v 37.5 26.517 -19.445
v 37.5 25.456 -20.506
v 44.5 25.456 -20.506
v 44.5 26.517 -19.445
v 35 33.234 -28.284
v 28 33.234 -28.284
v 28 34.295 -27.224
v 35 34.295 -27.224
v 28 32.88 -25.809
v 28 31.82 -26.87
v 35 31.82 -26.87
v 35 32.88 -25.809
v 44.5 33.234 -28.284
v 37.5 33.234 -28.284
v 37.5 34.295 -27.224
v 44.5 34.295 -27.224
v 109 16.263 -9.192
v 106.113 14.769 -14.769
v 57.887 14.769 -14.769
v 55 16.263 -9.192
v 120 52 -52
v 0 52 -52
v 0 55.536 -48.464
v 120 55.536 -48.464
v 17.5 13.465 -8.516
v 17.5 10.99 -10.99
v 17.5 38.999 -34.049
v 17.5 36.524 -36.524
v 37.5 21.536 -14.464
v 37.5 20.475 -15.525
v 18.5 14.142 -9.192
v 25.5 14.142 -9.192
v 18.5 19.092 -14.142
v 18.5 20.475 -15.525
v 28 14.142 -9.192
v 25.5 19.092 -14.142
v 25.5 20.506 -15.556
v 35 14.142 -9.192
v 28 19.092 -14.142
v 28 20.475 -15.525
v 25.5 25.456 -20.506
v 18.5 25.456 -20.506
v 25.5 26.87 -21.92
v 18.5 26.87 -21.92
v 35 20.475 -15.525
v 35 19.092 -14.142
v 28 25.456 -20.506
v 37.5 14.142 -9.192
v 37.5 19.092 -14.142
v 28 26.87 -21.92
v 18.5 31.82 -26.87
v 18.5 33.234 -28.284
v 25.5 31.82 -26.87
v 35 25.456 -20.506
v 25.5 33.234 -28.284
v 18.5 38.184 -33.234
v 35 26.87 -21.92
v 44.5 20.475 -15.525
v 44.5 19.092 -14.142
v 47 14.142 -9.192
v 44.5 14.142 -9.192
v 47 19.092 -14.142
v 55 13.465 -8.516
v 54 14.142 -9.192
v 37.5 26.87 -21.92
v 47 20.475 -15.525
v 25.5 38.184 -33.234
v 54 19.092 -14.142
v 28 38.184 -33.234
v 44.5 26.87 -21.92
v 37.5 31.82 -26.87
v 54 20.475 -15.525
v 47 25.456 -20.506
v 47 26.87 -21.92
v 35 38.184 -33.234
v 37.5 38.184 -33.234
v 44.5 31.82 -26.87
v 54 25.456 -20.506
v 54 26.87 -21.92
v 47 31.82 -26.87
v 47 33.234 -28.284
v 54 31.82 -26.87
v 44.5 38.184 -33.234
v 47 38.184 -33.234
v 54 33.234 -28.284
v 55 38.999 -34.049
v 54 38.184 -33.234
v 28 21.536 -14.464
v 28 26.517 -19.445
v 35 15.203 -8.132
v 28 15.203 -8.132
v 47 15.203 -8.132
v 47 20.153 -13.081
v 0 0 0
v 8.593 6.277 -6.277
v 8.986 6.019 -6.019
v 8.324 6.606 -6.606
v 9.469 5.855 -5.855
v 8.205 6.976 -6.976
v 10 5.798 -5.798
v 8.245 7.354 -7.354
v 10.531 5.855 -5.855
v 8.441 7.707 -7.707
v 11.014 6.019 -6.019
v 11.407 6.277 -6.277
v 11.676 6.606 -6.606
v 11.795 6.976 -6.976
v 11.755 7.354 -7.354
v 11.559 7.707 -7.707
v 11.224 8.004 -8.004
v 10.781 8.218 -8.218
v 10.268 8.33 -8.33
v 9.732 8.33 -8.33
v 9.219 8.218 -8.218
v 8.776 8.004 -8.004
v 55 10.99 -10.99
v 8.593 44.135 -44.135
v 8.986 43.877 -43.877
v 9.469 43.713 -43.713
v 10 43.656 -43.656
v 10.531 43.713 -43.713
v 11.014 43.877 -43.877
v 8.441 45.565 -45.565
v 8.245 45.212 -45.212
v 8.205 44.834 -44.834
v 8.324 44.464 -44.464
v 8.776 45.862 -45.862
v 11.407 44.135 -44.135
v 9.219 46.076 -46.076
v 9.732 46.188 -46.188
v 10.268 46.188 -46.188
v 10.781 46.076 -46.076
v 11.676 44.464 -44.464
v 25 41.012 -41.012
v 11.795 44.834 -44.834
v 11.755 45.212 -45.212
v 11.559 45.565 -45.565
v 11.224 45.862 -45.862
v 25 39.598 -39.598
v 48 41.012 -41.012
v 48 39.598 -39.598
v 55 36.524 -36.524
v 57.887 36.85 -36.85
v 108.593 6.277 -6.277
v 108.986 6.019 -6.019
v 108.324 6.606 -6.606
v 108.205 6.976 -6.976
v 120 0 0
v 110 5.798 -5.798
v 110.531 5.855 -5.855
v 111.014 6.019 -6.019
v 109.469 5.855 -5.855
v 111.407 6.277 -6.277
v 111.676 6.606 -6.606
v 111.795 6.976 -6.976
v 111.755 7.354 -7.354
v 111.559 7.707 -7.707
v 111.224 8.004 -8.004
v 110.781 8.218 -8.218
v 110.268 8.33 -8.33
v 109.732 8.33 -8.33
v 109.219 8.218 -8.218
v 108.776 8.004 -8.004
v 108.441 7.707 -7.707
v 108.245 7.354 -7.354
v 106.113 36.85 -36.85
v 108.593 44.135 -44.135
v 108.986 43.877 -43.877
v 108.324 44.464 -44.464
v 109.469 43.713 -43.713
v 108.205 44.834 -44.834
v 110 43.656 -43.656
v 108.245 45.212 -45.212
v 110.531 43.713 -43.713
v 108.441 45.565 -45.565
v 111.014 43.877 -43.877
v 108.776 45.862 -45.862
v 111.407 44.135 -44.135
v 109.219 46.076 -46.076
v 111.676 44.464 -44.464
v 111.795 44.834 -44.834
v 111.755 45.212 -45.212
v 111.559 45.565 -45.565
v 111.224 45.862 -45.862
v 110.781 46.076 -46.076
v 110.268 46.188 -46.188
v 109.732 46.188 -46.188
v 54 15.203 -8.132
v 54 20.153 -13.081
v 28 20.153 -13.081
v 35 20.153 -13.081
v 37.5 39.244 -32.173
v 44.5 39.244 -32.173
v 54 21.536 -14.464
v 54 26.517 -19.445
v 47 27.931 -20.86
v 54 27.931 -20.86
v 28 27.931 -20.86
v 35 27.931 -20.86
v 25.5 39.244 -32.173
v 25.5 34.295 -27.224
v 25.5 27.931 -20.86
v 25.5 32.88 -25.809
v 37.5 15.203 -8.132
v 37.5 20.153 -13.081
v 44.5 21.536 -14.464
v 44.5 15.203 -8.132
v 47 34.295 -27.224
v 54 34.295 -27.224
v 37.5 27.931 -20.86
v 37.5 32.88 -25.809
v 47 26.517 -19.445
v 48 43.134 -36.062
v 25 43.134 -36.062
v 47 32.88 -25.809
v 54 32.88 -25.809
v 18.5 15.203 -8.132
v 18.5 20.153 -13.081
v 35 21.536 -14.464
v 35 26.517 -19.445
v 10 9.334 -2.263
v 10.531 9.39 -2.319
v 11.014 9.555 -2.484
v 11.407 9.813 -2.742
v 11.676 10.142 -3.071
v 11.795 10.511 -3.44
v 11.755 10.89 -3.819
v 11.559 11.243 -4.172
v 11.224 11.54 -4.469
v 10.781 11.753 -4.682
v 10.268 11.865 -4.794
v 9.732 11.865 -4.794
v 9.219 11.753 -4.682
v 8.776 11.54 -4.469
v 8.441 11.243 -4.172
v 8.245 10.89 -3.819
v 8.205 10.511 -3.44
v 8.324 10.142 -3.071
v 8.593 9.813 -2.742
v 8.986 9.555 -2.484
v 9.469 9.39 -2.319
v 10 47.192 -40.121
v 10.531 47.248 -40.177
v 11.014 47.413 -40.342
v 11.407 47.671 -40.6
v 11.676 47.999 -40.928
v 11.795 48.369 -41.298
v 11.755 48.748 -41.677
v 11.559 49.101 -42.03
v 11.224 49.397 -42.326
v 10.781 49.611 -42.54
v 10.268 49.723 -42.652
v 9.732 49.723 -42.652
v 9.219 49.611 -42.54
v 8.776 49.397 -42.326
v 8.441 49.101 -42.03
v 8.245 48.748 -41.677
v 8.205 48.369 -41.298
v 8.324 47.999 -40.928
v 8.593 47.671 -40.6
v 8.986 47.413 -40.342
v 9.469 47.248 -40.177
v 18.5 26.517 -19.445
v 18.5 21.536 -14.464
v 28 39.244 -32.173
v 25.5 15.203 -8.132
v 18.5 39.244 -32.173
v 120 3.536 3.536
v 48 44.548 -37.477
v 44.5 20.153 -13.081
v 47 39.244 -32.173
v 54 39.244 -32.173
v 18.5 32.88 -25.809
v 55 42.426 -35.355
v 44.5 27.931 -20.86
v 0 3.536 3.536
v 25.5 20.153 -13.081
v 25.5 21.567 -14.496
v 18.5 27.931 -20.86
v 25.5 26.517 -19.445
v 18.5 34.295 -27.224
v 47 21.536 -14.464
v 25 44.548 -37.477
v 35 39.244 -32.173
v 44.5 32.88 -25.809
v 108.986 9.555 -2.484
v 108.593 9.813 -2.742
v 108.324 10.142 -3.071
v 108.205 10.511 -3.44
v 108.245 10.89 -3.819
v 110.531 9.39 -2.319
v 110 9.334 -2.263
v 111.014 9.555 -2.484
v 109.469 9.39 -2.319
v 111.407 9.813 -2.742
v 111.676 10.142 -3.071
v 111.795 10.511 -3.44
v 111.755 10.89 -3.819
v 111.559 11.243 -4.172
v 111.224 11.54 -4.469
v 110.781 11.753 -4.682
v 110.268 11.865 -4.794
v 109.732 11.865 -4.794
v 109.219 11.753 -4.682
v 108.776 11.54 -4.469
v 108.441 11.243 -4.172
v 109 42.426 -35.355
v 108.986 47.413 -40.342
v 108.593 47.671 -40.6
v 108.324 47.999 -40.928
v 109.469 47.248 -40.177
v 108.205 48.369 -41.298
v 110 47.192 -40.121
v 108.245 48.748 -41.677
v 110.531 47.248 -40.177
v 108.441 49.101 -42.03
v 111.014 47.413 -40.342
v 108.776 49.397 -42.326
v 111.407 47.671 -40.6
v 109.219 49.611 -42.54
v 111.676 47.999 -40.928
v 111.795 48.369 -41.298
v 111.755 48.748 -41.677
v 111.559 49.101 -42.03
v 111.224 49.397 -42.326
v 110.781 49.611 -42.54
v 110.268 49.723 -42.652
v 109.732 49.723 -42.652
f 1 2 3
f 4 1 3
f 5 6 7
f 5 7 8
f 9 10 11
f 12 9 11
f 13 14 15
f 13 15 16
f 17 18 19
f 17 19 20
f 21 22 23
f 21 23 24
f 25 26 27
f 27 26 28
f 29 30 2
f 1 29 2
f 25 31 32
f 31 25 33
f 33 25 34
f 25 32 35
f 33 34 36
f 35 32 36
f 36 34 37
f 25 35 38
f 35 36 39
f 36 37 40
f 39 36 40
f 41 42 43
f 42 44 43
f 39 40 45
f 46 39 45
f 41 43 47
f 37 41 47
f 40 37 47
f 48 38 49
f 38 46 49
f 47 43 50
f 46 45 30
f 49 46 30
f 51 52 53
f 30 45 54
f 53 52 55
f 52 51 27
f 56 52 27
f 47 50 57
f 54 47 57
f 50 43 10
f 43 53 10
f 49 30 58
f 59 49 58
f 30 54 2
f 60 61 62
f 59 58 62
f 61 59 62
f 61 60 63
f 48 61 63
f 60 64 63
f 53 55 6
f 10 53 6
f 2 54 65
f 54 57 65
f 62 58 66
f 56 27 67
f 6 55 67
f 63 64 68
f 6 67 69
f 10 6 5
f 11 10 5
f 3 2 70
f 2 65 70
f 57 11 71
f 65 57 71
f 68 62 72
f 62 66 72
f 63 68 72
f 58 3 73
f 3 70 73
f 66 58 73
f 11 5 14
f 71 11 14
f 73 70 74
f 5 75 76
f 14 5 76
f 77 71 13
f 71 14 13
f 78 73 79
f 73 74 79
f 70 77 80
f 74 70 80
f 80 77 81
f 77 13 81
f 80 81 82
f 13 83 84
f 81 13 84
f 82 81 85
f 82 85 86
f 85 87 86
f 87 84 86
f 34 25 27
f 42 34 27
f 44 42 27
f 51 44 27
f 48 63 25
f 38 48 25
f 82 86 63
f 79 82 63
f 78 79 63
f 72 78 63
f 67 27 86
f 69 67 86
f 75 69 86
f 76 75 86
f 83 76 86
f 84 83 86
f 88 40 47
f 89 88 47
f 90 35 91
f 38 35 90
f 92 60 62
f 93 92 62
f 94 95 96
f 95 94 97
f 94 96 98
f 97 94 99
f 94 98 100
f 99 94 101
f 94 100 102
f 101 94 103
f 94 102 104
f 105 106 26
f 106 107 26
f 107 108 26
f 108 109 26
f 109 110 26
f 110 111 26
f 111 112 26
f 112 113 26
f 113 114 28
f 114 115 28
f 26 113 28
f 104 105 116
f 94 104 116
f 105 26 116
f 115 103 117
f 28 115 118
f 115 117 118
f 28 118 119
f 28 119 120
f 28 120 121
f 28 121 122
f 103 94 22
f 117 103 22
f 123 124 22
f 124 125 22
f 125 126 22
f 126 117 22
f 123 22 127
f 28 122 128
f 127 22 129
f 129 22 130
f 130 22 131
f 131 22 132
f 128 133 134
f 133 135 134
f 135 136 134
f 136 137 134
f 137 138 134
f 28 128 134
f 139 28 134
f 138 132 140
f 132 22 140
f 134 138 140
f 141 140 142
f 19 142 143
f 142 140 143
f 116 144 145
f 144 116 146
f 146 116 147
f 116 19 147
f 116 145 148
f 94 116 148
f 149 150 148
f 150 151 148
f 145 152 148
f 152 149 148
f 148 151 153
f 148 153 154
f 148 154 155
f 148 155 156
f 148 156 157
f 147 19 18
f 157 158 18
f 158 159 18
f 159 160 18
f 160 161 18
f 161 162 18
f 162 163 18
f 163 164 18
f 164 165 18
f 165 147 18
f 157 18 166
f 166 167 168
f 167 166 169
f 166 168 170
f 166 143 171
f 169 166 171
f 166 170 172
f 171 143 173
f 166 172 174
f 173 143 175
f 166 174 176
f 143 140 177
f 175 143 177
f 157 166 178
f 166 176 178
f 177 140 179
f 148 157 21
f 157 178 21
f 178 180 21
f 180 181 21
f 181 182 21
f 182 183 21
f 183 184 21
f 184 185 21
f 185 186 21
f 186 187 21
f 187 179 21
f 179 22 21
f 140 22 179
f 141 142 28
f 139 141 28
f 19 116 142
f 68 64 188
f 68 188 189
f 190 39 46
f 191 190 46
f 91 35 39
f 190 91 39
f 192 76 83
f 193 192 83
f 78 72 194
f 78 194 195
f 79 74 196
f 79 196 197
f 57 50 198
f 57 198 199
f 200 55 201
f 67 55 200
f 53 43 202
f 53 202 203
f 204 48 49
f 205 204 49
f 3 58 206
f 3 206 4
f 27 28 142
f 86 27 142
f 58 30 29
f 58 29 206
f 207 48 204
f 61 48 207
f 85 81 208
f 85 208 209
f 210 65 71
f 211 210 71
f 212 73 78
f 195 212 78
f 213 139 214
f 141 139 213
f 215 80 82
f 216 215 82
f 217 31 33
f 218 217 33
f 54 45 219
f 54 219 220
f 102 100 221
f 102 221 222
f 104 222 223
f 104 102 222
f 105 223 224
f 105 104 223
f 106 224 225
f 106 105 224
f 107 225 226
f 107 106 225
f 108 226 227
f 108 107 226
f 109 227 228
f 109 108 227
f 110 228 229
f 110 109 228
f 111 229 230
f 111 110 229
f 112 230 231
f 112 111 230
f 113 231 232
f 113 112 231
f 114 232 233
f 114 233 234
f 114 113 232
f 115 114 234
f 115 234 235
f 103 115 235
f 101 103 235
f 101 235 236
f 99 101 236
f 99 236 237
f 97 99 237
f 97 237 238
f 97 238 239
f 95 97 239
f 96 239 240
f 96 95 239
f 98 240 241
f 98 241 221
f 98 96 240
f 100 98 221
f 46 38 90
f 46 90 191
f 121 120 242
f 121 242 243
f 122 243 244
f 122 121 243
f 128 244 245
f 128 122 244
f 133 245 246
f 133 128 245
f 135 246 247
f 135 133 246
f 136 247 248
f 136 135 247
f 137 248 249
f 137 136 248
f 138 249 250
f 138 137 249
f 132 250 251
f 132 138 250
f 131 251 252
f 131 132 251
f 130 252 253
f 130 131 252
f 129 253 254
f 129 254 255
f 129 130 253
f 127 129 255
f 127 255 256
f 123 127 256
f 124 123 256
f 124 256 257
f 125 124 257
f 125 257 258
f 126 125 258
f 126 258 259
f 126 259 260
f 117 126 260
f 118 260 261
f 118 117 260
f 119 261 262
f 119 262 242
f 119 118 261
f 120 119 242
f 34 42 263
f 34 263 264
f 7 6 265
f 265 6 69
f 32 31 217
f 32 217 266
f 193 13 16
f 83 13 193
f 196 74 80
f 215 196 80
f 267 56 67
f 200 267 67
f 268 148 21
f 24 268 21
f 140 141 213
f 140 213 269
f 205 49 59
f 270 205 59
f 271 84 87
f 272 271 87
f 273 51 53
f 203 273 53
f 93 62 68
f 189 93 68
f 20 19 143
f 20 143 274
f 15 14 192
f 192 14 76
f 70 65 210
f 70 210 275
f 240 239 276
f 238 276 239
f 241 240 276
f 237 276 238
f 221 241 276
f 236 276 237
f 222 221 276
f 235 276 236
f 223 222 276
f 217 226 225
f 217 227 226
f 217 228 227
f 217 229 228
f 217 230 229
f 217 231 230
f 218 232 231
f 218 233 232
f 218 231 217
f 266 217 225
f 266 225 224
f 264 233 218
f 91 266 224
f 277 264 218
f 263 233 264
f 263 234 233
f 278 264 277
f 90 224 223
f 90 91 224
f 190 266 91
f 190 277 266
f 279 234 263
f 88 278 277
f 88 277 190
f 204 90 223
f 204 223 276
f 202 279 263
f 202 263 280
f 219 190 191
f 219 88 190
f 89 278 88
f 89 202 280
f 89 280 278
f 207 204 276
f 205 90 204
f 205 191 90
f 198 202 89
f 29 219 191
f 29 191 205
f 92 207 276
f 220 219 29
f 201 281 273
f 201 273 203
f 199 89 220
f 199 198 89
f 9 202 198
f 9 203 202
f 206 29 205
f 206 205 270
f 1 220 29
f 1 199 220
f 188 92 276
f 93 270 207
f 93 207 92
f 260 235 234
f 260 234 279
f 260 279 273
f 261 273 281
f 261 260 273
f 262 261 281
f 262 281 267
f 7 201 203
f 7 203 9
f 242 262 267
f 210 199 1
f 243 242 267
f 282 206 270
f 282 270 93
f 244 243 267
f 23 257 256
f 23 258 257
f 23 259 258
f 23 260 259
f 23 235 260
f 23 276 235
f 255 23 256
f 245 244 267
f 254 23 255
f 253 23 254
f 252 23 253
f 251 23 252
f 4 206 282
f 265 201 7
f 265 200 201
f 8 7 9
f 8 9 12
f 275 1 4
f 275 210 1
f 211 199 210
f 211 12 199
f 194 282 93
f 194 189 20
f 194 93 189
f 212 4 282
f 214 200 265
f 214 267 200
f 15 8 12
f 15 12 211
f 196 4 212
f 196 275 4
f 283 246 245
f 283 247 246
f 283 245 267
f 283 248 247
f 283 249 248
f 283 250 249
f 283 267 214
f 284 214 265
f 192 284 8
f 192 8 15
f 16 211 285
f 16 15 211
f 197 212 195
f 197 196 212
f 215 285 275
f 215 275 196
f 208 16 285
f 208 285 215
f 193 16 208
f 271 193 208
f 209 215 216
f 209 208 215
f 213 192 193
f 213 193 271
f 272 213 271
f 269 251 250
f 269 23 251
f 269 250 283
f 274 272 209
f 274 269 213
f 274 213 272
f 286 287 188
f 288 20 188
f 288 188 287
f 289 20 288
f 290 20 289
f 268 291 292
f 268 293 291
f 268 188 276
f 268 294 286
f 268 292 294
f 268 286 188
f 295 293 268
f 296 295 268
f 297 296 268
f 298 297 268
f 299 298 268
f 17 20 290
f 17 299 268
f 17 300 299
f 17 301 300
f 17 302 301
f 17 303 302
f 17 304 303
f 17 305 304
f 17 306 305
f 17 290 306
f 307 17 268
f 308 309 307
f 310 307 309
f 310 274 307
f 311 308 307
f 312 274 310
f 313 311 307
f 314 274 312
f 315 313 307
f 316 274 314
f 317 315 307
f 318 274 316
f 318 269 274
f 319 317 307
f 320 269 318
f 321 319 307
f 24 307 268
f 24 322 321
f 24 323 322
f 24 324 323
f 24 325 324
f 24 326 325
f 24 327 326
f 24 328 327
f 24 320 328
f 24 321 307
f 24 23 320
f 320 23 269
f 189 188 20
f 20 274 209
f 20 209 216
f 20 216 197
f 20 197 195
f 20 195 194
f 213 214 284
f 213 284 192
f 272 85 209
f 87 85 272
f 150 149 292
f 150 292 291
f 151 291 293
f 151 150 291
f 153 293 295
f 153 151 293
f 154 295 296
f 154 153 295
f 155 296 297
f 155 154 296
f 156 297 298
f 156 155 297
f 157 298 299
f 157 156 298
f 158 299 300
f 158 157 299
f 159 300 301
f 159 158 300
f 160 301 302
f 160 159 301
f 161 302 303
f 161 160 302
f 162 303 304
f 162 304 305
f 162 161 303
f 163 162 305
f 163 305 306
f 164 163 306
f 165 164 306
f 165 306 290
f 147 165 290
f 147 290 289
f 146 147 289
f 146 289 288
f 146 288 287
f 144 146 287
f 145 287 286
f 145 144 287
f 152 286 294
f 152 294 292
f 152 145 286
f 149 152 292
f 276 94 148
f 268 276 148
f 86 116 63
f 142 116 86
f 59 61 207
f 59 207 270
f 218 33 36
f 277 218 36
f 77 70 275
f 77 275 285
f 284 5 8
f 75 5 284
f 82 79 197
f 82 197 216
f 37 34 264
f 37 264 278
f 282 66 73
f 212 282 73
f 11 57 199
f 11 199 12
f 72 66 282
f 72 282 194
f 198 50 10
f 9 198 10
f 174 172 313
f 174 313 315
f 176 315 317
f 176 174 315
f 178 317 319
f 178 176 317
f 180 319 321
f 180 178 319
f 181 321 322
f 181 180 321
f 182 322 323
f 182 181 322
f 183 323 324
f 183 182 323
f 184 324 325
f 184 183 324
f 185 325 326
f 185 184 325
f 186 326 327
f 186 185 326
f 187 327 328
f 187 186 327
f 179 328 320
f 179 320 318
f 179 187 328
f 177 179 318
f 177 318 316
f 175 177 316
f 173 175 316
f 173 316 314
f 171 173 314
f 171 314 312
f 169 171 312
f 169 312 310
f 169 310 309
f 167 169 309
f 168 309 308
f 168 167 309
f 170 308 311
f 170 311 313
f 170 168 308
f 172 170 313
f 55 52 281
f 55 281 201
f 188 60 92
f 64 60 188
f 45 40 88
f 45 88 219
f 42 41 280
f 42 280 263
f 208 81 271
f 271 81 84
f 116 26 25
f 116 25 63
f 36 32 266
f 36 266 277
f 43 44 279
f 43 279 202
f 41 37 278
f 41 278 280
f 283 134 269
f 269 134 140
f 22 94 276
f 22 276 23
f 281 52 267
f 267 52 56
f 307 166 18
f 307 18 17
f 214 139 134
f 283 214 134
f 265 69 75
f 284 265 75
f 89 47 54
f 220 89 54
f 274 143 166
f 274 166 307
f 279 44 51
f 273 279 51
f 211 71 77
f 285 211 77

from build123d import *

# Parameters (mm, degrees)
SKETCH_1_W          = 120
SKETCH_1_H          = 73.539105243
SKETCH_1_R          = 1.8
SKETCH_1_W_2        = 48
SKETCH_1_H_2        = 31
SKETCH_1_W_3        = 23
SKETCH_1_H_3        = 2
SKETCH_1_W_4        = 7
SKETCH_1_H_4        = 7
SKETCH_1_H_5        = 7.044155877
EXTRUDE_1_DEPTH     = 5
SKETCH_2_W          = 37.5
SKETCH_2_H          = 36.110051057
CUT_EXTRUDE_1_DEPTH = 3.5


with BuildPart() as part:
    # Эскиз1 → Бобышка-Вытянуть1 (new body)
    with BuildSketch(Plane(origin=(0, 0, 0), x_dir=(1, 0, 0), z_dir=(0, 0.7071067811865477, 0.7071067811865475))):
        with Locations((60, 36.769552622)):
            Rectangle(SKETCH_1_W, SKETCH_1_H)
        with Locations(Location((10, 63.539105243, 0), (0, 0, 270))):
            Circle(SKETCH_1_R, mode=Mode.SUBTRACT)
        with Locations(Location((110, 63.539105243, 0), (0, 0, 270))):
            Circle(SKETCH_1_R, mode=Mode.SUBTRACT)
        with Locations(Location((110, 10, 0), (0, 0, 270))):
            Circle(SKETCH_1_R, mode=Mode.SUBTRACT)
        with Locations(Location((10, 10, 0), (0, 0, 270))):
            Circle(SKETCH_1_R, mode=Mode.SUBTRACT)
        with Locations((82, 36.5)):
            Rectangle(SKETCH_1_W_2, SKETCH_1_H_2, mode=Mode.SUBTRACT)
        with Locations((36.5, 57)):
            Rectangle(SKETCH_1_W_3, SKETCH_1_H_3, mode=Mode.SUBTRACT)
        with Locations((50.5, 47)):
            Rectangle(SKETCH_1_W_4, SKETCH_1_H_4, mode=Mode.SUBTRACT)
        with Locations((41, 47)):
            Rectangle(SKETCH_1_W_4, SKETCH_1_H_4, mode=Mode.SUBTRACT)
        with Locations((31.5, 47)):
            Rectangle(SKETCH_1_W_4, SKETCH_1_H_4, mode=Mode.SUBTRACT)
        with Locations((22, 47)):
            Rectangle(SKETCH_1_W_4, SKETCH_1_H_4, mode=Mode.SUBTRACT)
        with Locations((22, 38)):
            Rectangle(SKETCH_1_W_4, SKETCH_1_H_4, mode=Mode.SUBTRACT)
        Polygon((18.5, 32.5), (18.5, 25.455844123), (25.5, 25.5), (25.5, 32.5), align=None, mode=Mode.SUBTRACT)
        with Locations((22, 20)):
            Rectangle(SKETCH_1_W_4, SKETCH_1_H_4, mode=Mode.SUBTRACT)
        with Locations((31.5, 20)):
            Rectangle(SKETCH_1_W_4, SKETCH_1_H_4, mode=Mode.SUBTRACT)
        with Locations((41, 20)):
            Rectangle(SKETCH_1_W_4, SKETCH_1_H_4, mode=Mode.SUBTRACT)
        with Locations((50.5, 20)):
            Rectangle(SKETCH_1_W_4, SKETCH_1_H_4, mode=Mode.SUBTRACT)
        with Locations((50.5, 28.977922062)):
            Rectangle(SKETCH_1_W_4, SKETCH_1_H_5, mode=Mode.SUBTRACT)
        with Locations((41, 38)):
            Rectangle(SKETCH_1_W_4, SKETCH_1_H_4, mode=Mode.SUBTRACT)
        with Locations((50.5, 38)):
            Rectangle(SKETCH_1_W_4, SKETCH_1_H_4, mode=Mode.SUBTRACT)
        with Locations((31.5, 38)):
            Rectangle(SKETCH_1_W_4, SKETCH_1_H_4, mode=Mode.SUBTRACT)
        with Locations((31.5, 28.977922062)):
            Rectangle(SKETCH_1_W_4, SKETCH_1_H_5, mode=Mode.SUBTRACT)
        with Locations((41, 28.977922062)):
            Rectangle(SKETCH_1_W_4, SKETCH_1_H_5, mode=Mode.SUBTRACT)
    extrude(amount=EXTRUDE_1_DEPTH)

    # Фаска1
    # the kernel refuses this chamfer: 5.196152423, 3 mm, written as the material it takes off along each edge
    with BuildSketch(Plane(origin=(58, 18.384776311, -11.313708499), x_dir=(0.01932676561270104, -0.706974708221925, -0.7069747082219248), z_dir=(0, 0.7071067811865475, -0.7071067811865477)), Plane(origin=(106, 40.305086528, -33.234018716), x_dir=(-0.019326765612701025, -0.706974708221925, -0.7069747082219249), z_dir=(0, -0.7071067811865475, 0.7071067811865477))) as chamfer_1_piece_1:
        with BuildLine():
            Line((5.377156765, 0), (-0.239955173, 3.099864482))
            Line((-0.239955173, 3.099864482), (-0.343858811, 3.097855985))
            ThreePointArc((-0.343858811, 3.097855985), (-0.133898034, 1.549663153), (-0.103903638, -0.002008496))
            Line((-0.103903638, -0.002008496), (0.002008496, -0.103903638))
            ThreePointArc((0.002008496, -0.103903638), (2.689582631, -0.051951819), (5.379165261, -0.103903638))
            Line((5.379165261, -0.103903638), (5.377156765, 0))
        make_face()
    extrude(amount=31, mode=Mode.SUBTRACT)
    with BuildSketch(Plane(origin=(106, 18.384776311, -11.313708499), x_dir=(0, -0.6933086211987814, -0.7206407952450685), z_dir=(-1, 0, 0)), Plane(origin=(58, 40.305086528, -33.234018716), x_dir=(0, -0.7206407952450687, -0.693308621198781), z_dir=(1, 0, 0))) as chamfer_1_piece_2:
        with BuildLine():
            Line((5.377156765, 0), (-0.239955173, 3.099864482))
            Line((-0.239955173, 3.099864482), (-0.343858811, 3.097855985))
            ThreePointArc((-0.343858811, 3.097855985), (-0.133898034, 1.549663153), (-0.103903638, -0.002008496))
            Line((-0.103903638, -0.002008496), (0.002008496, -0.103903638))
            ThreePointArc((0.002008496, -0.103903638), (2.689582631, -0.051951819), (5.379165261, -0.103903638))
            Line((5.379165261, -0.103903638), (5.377156765, 0))
        make_face()
    extrude(amount=48, mode=Mode.SUBTRACT)
    with BuildSketch(Plane(origin=(106, 18.384776311, -11.313708499), x_dir=(0, -0.6933086211987814, -0.7206407952450685), z_dir=(-1, 0, 0))) as chamfer_1_piece_3a_section:
        with BuildLine():
            Line((5.377156765, 0), (-0.239955173, 3.099864482))
            Line((-0.239955173, 3.099864482), (-0.343858811, 3.097855985))
            ThreePointArc((-0.343858811, 3.097855985), (-0.133898034, 1.549663153), (-0.103903638, -0.002008496))
            Line((-0.103903638, -0.002008496), (0.002008496, -0.103903638))
            ThreePointArc((0.002008496, -0.103903638), (2.689582631, -0.051951819), (5.379165261, -0.103903638))
            Line((5.379165261, -0.103903638), (5.377156765, 0))
        make_face()
    chamfer_1_piece_3a = extrude(amount=61.442891912, mode=Mode.PRIVATE)
    chamfer_1_piece_3a = split(chamfer_1_piece_3a, bisect_by=Plane(origin=(58, 16.472259587, -11.865738078), z_dir=(-1, 0, 0)), keep=Keep.TOP, mode=Mode.PRIVATE)
    with BuildSketch(Plane(origin=(58, 8.879216281, -1.808148469), x_dir=(0.01932676561270103, -0.706974708221925, -0.7069747082219248), z_dir=(0, 0.7071067811865475, -0.7071067811865477))) as chamfer_1_piece_3b_section:
        with BuildLine():
            Line((5.377156765, 0), (-0.239955173, 3.099864482))
            Line((-0.239955173, 3.099864482), (-0.343858811, 3.097855985))
            ThreePointArc((-0.343858811, 3.097855985), (-0.133898034, 1.549663153), (-0.103903638, -0.002008496))
            Line((-0.103903638, -0.002008496), (0.002008496, -0.103903638))
            ThreePointArc((0.002008496, -0.103903638), (2.689582631, -0.051951819), (5.379165261, -0.103903638))
            Line((5.379165261, -0.103903638), (5.377156765, 0))
        make_face()
    chamfer_1_piece_3b = extrude(amount=44.442891912, mode=Mode.PRIVATE)
    chamfer_1_piece_3b = split(chamfer_1_piece_3b, bisect_by=Plane(origin=(57.037990314, 17.15250316, -12.54598165), z_dir=(0, -0.7071067811865475, 0.7071067811865477)), keep=Keep.TOP, mode=Mode.PRIVATE)
    chamfer_1_piece_3 = chamfer_1_piece_3a & chamfer_1_piece_3b
    add(chamfer_1_piece_3, mode=Mode.SUBTRACT)
    with BuildSketch(Plane(origin=(44.557108088, 40.305086528, -33.234018716), x_dir=(0, -0.7206407952450687, -0.693308621198781), z_dir=(1, 0, 0))) as chamfer_1_piece_4a_section:
        with BuildLine():
            Line((5.377156765, 0), (-0.239955173, 3.099864482))
            Line((-0.239955173, 3.099864482), (-0.343858811, 3.097855985))
            ThreePointArc((-0.343858811, 3.097855985), (-0.133898034, 1.549663153), (-0.103903638, -0.002008496))
            Line((-0.103903638, -0.002008496), (0.002008496, -0.103903638))
            ThreePointArc((0.002008496, -0.103903638), (2.689582631, -0.051951819), (5.379165261, -0.103903638))
            Line((5.379165261, -0.103903638), (5.377156765, 0))
        make_face()
    chamfer_1_piece_4a = extrude(amount=61.442891912, mode=Mode.PRIVATE)
    chamfer_1_piece_4a = split(chamfer_1_piece_4a, bisect_by=Plane(origin=(58, 39.753056949, -35.146535439), z_dir=(-1, 0, 0)), keep=Keep.TOP, mode=Mode.PRIVATE)
    with BuildSketch(Plane(origin=(58, 18.384776311, -11.313708499), x_dir=(0.01932676561270104, -0.706974708221925, -0.7069747082219248), z_dir=(0, 0.7071067811865475, -0.7071067811865477))) as chamfer_1_piece_4b_section:
        with BuildLine():
            Line((5.377156765, 0), (-0.239955173, 3.099864482))
            Line((-0.239955173, 3.099864482), (-0.343858811, 3.097855985))
            ThreePointArc((-0.343858811, 3.097855985), (-0.133898034, 1.549663153), (-0.103903638, -0.002008496))
            Line((-0.103903638, -0.002008496), (0.002008496, -0.103903638))
            ThreePointArc((0.002008496, -0.103903638), (2.689582631, -0.051951819), (5.379165261, -0.103903638))
            Line((5.379165261, -0.103903638), (5.377156765, 0))
        make_face()
    chamfer_1_piece_4b = extrude(amount=44.442891912, mode=Mode.PRIVATE)
    chamfer_1_piece_4b = split(chamfer_1_piece_4b, bisect_by=Plane(origin=(57.037990314, 39.072813376, -34.466291867), z_dir=(0, 0.7071067811865475, -0.7071067811865477)), keep=Keep.TOP, mode=Mode.PRIVATE)
    chamfer_1_piece_4 = chamfer_1_piece_4a & chamfer_1_piece_4b
    add(chamfer_1_piece_4, mode=Mode.SUBTRACT)
    with BuildSketch(Plane(origin=(106, 40.305086528, -33.234018716), x_dir=(-0.019326765612701025, -0.706974708221925, -0.7069747082219249), z_dir=(0, -0.7071067811865475, 0.7071067811865477))) as chamfer_1_piece_5a_section:
        with BuildLine():
            Line((5.377156765, 0), (-0.239955173, 3.099864482))
            Line((-0.239955173, 3.099864482), (-0.343858811, 3.097855985))
            ThreePointArc((-0.343858811, 3.097855985), (-0.133898034, 1.549663153), (-0.103903638, -0.002008496))
            Line((-0.103903638, -0.002008496), (0.002008496, -0.103903638))
            ThreePointArc((0.002008496, -0.103903638), (2.689582631, -0.051951819), (5.379165261, -0.103903638))
            Line((5.379165261, -0.103903638), (5.377156765, 0))
        make_face()
    chamfer_1_piece_5a = extrude(amount=44.442891912, mode=Mode.PRIVATE)
    chamfer_1_piece_5a = split(chamfer_1_piece_5a, bisect_by=Plane(origin=(106.962009686, 17.15250316, -12.54598165), z_dir=(0, -0.7071067811865475, 0.7071067811865477)), keep=Keep.TOP, mode=Mode.PRIVATE)
    with BuildSketch(Plane(origin=(119.442891912, 18.384776311, -11.313708499), x_dir=(0, -0.6933086211987812, -0.7206407952450685), z_dir=(-1, 0, 0))) as chamfer_1_piece_5b_section:
        with BuildLine():
            Line((5.377156765, 0), (-0.239955173, 3.099864482))
            Line((-0.239955173, 3.099864482), (-0.343858811, 3.097855985))
            ThreePointArc((-0.343858811, 3.097855985), (-0.133898034, 1.549663153), (-0.103903638, -0.002008496))
            Line((-0.103903638, -0.002008496), (0.002008496, -0.103903638))
            ThreePointArc((0.002008496, -0.103903638), (2.689582631, -0.051951819), (5.379165261, -0.103903638))
            Line((5.379165261, -0.103903638), (5.377156765, 0))
        make_face()
    chamfer_1_piece_5b = extrude(amount=61.442891912, mode=Mode.PRIVATE)
    chamfer_1_piece_5b = split(chamfer_1_piece_5b, bisect_by=Plane(origin=(106, 16.472259587, -11.865738078), z_dir=(1, 0, 0)), keep=Keep.TOP, mode=Mode.PRIVATE)
    chamfer_1_piece_5 = chamfer_1_piece_5a & chamfer_1_piece_5b
    add(chamfer_1_piece_5, mode=Mode.SUBTRACT)
    with BuildSketch(Plane(origin=(58, 40.305086528, -33.234018716), x_dir=(0, -0.7206407952450687, -0.693308621198781), z_dir=(1, 0, 0))) as chamfer_1_piece_6a_section:
        with BuildLine():
            Line((5.377156765, 0), (-0.239955173, 3.099864482))
            Line((-0.239955173, 3.099864482), (-0.343858811, 3.097855985))
            ThreePointArc((-0.343858811, 3.097855985), (-0.133898034, 1.549663153), (-0.103903638, -0.002008496))
            Line((-0.103903638, -0.002008496), (0.002008496, -0.103903638))
            ThreePointArc((0.002008496, -0.103903638), (2.689582631, -0.051951819), (5.379165261, -0.103903638))
            Line((5.379165261, -0.103903638), (5.377156765, 0))
        make_face()
    chamfer_1_piece_6a = extrude(amount=61.442891912, mode=Mode.PRIVATE)
    chamfer_1_piece_6a = split(chamfer_1_piece_6a, bisect_by=Plane(origin=(106, 39.753056949, -35.146535439), z_dir=(1, 0, 0)), keep=Keep.TOP, mode=Mode.PRIVATE)
    with BuildSketch(Plane(origin=(106, 49.810646557, -42.739578745), x_dir=(-0.019326765612701025, -0.706974708221925, -0.7069747082219249), z_dir=(0, -0.7071067811865475, 0.7071067811865477))) as chamfer_1_piece_6b_section:
        with BuildLine():
            Line((5.377156765, 0), (-0.239955173, 3.099864482))
            Line((-0.239955173, 3.099864482), (-0.343858811, 3.097855985))
            ThreePointArc((-0.343858811, 3.097855985), (-0.133898034, 1.549663153), (-0.103903638, -0.002008496))
            Line((-0.103903638, -0.002008496), (0.002008496, -0.103903638))
            ThreePointArc((0.002008496, -0.103903638), (2.689582631, -0.051951819), (5.379165261, -0.103903638))
            Line((5.379165261, -0.103903638), (5.377156765, 0))
        make_face()
    chamfer_1_piece_6b = extrude(amount=44.442891912, mode=Mode.PRIVATE)
    chamfer_1_piece_6b = split(chamfer_1_piece_6b, bisect_by=Plane(origin=(106.962009686, 39.072813376, -34.466291867), z_dir=(0, 0.7071067811865475, -0.7071067811865477)), keep=Keep.TOP, mode=Mode.PRIVATE)
    chamfer_1_piece_6 = chamfer_1_piece_6a & chamfer_1_piece_6b
    add(chamfer_1_piece_6, mode=Mode.SUBTRACT)

    # Эскиз2 → Вырез-Вытянуть1 (cut)
    with BuildSketch(Plane(origin=(0, 0, 0), x_dir=(1, 0, 0), z_dir=(0, 0.7071067811865477, 0.7071067811865475))):
        with Locations((36.25, 33.597850417)):
            Rectangle(SKETCH_2_W, SKETCH_2_H)
    extrude(amount=CUT_EXTRUDE_1_DEPTH, mode=Mode.SUBTRACT)


solid = part.part
